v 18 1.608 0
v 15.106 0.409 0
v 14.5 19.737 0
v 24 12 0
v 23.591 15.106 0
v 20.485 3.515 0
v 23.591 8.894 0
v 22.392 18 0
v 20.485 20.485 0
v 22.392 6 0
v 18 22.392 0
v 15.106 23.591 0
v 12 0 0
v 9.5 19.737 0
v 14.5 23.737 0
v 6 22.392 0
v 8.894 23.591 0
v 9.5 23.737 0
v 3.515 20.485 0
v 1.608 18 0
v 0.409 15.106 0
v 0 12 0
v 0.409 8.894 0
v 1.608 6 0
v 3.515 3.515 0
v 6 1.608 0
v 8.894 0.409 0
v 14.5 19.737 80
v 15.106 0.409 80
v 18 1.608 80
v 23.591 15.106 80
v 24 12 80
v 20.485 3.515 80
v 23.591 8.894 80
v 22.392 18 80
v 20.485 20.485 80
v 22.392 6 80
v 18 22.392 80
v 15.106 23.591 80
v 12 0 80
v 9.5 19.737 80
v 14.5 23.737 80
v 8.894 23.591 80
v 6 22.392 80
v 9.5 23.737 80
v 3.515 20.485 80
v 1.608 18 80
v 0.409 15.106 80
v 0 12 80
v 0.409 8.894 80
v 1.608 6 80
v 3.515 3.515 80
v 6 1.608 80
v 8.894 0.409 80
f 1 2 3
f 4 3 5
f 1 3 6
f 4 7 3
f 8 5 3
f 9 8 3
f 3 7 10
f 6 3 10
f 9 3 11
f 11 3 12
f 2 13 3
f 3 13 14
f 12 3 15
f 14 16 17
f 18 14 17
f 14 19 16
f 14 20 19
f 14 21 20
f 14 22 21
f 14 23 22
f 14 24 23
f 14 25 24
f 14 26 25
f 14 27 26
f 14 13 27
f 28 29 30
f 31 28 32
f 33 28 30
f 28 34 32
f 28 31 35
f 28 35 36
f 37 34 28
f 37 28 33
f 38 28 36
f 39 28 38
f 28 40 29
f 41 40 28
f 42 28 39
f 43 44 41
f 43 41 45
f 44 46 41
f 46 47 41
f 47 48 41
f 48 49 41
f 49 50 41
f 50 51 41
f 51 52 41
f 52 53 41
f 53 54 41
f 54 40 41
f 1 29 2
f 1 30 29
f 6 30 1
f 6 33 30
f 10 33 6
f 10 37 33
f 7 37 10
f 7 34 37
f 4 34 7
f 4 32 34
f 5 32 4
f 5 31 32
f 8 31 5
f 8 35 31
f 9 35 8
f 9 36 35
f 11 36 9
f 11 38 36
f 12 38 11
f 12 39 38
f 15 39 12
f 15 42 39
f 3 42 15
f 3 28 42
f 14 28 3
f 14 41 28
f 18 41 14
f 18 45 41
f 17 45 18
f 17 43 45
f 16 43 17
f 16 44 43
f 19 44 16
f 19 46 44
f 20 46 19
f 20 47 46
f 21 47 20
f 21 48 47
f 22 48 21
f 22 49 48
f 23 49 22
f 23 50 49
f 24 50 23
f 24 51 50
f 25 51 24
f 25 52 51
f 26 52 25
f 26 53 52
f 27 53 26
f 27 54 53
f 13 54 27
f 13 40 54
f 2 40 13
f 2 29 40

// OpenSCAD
$fn = 32;

// ----------------------------------------------------------------------
// Keyway shaft: d24 shaft, key 5 x 4 mm
// ----------------------------------------------------------------------

// --- parameters (mm) ---
shaft_r = 12;             // shaft radius
key_w = 5;                // keyway width
key_d = 4;                // keyway depth below the surface line
plate_t = 80;             // shaft length, Z (extrusion height)
fit_tol = 0.1;            // declared fit tolerance (prompt contract)
free_tol = 0.3;           // declared free tolerance (prompt contract)

shaft_d = 2 * shaft_r;  // shaft diameter
circle_step = 15;  // polygon sampling step, degrees

profile = [[8.894, 23.591], [6, 22.392], [3.515, 20.485], [1.608, 18], [0.409, 15.106], [0, 12], [0.409, 8.894], [1.608, 6], [3.515, 3.515], [6, 1.608], [8.894, 0.409], [12, 0], [15.106, 0.409], [18, 1.608], [20.485, 3.515], [22.392, 6], [23.591, 8.894], [24, 12], [23.591, 15.106], [22.392, 18], [20.485, 20.485], [18, 22.392], [15.106, 23.591], [14.5, 23.737], [14.5, 19.737], [9.5, 19.737], [9.5, 23.737]];  // primary outline, 27 points, counter clockwise

// --- the one profile operation ---
linear_extrude(height = plate_t) polygon(points = profile);
